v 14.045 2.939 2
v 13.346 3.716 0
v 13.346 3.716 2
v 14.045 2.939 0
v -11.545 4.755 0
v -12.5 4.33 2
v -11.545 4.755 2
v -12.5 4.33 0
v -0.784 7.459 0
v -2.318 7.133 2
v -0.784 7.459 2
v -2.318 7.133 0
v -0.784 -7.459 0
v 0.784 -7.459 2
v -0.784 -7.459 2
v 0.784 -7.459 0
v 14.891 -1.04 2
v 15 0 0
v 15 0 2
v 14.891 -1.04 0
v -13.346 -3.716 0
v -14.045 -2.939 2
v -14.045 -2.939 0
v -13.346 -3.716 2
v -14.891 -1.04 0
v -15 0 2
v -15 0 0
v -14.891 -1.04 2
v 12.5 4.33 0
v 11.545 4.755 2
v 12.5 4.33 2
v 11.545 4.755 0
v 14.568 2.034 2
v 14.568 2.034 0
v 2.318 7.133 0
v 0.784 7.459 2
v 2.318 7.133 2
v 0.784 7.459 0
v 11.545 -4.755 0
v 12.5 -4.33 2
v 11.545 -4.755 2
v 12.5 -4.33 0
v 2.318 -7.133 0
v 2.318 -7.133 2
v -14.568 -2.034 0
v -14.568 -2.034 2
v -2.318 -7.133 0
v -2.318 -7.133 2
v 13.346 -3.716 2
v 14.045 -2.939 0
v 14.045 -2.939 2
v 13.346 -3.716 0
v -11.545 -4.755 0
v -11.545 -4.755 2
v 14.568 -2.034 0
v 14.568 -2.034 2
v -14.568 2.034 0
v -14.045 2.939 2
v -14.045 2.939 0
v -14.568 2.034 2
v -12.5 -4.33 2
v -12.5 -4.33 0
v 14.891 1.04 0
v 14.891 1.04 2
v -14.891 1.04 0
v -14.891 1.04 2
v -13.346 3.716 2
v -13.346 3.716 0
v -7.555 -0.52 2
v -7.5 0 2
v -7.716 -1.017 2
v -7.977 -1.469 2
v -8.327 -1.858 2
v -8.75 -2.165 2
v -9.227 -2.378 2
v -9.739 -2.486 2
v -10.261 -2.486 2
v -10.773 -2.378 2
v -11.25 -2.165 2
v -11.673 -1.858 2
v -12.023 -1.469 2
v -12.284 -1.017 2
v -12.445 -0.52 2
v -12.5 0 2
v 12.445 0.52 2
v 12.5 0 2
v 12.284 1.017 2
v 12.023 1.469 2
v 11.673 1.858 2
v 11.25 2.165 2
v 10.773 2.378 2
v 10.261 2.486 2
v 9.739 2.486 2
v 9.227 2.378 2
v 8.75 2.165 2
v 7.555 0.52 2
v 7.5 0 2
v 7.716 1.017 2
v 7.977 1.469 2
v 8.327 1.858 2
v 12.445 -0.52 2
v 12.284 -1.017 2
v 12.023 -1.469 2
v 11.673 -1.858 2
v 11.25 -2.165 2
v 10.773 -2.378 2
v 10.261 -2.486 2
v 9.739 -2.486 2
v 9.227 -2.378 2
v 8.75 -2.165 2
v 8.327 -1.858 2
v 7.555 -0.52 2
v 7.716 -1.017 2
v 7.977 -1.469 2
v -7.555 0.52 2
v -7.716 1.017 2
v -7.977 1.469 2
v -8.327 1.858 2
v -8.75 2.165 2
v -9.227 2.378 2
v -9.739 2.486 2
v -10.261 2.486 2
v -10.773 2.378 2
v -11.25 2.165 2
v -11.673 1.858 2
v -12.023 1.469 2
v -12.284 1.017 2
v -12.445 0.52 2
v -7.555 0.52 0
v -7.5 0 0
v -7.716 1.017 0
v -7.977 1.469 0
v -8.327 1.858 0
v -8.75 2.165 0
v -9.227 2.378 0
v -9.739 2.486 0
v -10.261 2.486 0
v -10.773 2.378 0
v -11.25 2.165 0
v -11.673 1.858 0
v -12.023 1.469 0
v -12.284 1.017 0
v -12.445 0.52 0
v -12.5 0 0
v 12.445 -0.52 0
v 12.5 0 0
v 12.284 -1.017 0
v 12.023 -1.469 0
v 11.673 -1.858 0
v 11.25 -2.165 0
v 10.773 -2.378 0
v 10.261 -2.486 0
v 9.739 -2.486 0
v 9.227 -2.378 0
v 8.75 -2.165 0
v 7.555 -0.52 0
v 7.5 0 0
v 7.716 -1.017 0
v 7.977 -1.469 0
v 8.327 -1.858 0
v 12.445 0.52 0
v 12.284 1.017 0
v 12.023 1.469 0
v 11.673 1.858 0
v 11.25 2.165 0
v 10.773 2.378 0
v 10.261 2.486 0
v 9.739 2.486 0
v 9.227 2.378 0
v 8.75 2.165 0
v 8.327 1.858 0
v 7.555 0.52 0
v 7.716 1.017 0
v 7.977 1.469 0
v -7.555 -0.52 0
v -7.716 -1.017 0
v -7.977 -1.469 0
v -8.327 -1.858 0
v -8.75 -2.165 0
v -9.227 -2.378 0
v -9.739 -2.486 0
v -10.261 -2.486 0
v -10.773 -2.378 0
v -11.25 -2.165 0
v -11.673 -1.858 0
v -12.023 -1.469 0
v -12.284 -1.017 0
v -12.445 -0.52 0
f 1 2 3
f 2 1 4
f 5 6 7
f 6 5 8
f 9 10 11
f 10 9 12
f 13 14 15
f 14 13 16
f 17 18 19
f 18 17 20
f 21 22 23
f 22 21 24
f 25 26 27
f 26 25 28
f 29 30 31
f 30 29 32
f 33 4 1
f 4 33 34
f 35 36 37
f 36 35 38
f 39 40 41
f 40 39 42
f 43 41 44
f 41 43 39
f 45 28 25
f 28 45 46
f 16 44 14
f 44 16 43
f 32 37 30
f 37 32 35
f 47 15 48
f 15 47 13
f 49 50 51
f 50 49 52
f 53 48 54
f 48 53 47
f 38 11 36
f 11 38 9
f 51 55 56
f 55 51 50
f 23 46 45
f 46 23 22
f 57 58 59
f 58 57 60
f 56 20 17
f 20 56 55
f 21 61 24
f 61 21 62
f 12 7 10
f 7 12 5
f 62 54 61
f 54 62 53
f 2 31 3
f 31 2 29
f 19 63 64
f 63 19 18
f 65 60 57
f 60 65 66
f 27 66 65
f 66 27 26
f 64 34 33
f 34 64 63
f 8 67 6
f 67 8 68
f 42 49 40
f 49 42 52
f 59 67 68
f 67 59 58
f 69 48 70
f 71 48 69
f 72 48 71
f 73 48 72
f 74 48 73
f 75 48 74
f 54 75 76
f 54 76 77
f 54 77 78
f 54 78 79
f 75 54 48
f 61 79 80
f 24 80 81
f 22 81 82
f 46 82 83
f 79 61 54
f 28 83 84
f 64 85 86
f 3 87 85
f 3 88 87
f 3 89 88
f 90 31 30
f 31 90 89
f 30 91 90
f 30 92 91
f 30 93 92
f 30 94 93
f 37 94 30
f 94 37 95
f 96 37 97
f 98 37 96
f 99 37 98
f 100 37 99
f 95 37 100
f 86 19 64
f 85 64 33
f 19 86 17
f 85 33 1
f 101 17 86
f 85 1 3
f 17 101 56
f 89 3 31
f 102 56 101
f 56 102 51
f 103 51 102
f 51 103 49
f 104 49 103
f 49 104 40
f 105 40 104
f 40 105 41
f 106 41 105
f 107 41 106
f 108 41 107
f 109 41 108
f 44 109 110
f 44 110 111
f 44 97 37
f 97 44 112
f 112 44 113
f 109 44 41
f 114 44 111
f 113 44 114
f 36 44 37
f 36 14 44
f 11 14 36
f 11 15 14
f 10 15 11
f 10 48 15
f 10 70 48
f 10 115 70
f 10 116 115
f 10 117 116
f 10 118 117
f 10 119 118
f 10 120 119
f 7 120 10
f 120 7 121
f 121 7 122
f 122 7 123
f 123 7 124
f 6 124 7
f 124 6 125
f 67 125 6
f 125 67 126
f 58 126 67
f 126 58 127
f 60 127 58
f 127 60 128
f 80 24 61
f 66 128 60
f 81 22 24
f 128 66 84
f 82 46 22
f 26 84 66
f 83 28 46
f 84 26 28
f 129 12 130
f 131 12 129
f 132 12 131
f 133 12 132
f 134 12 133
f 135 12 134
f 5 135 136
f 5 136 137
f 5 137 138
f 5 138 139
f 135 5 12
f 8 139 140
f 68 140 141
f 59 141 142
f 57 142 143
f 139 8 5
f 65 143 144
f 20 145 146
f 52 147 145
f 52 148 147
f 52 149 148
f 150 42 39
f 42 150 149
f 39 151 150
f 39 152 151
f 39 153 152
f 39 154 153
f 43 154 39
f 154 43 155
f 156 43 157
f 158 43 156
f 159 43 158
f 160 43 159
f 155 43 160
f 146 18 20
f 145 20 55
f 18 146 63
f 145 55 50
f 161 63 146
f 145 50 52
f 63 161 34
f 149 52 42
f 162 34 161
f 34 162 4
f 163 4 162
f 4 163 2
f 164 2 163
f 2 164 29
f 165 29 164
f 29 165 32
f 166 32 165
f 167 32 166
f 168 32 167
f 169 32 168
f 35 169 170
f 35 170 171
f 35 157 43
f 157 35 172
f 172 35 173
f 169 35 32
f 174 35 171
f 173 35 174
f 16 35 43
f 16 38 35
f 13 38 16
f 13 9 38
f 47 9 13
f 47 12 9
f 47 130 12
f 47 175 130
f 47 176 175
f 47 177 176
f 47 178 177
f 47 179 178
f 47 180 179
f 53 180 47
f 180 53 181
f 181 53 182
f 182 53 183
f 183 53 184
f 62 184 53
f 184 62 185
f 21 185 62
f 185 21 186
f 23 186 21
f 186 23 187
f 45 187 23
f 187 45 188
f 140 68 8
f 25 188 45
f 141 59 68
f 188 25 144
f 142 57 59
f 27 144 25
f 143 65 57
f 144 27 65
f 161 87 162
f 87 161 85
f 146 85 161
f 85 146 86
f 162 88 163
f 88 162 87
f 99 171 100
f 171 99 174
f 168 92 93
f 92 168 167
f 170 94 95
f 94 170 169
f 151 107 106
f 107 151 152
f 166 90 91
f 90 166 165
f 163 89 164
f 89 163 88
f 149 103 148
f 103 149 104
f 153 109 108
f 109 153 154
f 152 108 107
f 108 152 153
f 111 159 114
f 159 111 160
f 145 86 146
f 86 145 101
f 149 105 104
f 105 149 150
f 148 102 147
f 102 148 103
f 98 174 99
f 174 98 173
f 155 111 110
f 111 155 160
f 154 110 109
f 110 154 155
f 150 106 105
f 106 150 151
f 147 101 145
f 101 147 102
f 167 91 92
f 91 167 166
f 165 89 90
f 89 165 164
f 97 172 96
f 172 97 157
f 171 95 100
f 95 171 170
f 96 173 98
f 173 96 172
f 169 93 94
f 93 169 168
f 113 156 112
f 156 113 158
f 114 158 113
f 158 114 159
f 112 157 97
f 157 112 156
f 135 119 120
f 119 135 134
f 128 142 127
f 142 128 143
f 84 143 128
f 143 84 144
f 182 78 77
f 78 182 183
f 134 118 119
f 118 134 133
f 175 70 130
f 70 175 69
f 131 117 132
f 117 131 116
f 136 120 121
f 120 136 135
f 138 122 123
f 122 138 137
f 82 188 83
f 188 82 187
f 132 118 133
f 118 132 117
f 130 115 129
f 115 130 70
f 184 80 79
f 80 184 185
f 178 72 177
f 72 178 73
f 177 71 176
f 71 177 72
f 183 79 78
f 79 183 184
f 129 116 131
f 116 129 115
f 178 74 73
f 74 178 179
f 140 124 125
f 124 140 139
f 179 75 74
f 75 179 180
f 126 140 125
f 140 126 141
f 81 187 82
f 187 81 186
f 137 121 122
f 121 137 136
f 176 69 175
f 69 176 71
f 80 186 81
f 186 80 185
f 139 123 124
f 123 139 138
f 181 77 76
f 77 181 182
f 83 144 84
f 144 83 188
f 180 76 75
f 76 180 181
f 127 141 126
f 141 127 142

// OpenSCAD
// file: config.scad
$fs=0.5;

di_m4_t = 3.6;
di_m4_d = 4.4;

di_m4_nut = 8.5;

di_m2_t = 1.8;
// main file
include <config.scad>
module pivit_rod_cap() {
    difference() {
        hull() {
            cylinder(d=15, h=2);
            translate([10, 0, 0]) cylinder(d=10, h=2);
            translate([-10, 0, 0]) cylinder(d=10, h=2);
        }
        translate([10, 0, -1]) cylinder(d=5, h=4);
        translate([-10, 0, -1]) cylinder(d=5, h=4);
    }
}

pivit_rod_cap();
